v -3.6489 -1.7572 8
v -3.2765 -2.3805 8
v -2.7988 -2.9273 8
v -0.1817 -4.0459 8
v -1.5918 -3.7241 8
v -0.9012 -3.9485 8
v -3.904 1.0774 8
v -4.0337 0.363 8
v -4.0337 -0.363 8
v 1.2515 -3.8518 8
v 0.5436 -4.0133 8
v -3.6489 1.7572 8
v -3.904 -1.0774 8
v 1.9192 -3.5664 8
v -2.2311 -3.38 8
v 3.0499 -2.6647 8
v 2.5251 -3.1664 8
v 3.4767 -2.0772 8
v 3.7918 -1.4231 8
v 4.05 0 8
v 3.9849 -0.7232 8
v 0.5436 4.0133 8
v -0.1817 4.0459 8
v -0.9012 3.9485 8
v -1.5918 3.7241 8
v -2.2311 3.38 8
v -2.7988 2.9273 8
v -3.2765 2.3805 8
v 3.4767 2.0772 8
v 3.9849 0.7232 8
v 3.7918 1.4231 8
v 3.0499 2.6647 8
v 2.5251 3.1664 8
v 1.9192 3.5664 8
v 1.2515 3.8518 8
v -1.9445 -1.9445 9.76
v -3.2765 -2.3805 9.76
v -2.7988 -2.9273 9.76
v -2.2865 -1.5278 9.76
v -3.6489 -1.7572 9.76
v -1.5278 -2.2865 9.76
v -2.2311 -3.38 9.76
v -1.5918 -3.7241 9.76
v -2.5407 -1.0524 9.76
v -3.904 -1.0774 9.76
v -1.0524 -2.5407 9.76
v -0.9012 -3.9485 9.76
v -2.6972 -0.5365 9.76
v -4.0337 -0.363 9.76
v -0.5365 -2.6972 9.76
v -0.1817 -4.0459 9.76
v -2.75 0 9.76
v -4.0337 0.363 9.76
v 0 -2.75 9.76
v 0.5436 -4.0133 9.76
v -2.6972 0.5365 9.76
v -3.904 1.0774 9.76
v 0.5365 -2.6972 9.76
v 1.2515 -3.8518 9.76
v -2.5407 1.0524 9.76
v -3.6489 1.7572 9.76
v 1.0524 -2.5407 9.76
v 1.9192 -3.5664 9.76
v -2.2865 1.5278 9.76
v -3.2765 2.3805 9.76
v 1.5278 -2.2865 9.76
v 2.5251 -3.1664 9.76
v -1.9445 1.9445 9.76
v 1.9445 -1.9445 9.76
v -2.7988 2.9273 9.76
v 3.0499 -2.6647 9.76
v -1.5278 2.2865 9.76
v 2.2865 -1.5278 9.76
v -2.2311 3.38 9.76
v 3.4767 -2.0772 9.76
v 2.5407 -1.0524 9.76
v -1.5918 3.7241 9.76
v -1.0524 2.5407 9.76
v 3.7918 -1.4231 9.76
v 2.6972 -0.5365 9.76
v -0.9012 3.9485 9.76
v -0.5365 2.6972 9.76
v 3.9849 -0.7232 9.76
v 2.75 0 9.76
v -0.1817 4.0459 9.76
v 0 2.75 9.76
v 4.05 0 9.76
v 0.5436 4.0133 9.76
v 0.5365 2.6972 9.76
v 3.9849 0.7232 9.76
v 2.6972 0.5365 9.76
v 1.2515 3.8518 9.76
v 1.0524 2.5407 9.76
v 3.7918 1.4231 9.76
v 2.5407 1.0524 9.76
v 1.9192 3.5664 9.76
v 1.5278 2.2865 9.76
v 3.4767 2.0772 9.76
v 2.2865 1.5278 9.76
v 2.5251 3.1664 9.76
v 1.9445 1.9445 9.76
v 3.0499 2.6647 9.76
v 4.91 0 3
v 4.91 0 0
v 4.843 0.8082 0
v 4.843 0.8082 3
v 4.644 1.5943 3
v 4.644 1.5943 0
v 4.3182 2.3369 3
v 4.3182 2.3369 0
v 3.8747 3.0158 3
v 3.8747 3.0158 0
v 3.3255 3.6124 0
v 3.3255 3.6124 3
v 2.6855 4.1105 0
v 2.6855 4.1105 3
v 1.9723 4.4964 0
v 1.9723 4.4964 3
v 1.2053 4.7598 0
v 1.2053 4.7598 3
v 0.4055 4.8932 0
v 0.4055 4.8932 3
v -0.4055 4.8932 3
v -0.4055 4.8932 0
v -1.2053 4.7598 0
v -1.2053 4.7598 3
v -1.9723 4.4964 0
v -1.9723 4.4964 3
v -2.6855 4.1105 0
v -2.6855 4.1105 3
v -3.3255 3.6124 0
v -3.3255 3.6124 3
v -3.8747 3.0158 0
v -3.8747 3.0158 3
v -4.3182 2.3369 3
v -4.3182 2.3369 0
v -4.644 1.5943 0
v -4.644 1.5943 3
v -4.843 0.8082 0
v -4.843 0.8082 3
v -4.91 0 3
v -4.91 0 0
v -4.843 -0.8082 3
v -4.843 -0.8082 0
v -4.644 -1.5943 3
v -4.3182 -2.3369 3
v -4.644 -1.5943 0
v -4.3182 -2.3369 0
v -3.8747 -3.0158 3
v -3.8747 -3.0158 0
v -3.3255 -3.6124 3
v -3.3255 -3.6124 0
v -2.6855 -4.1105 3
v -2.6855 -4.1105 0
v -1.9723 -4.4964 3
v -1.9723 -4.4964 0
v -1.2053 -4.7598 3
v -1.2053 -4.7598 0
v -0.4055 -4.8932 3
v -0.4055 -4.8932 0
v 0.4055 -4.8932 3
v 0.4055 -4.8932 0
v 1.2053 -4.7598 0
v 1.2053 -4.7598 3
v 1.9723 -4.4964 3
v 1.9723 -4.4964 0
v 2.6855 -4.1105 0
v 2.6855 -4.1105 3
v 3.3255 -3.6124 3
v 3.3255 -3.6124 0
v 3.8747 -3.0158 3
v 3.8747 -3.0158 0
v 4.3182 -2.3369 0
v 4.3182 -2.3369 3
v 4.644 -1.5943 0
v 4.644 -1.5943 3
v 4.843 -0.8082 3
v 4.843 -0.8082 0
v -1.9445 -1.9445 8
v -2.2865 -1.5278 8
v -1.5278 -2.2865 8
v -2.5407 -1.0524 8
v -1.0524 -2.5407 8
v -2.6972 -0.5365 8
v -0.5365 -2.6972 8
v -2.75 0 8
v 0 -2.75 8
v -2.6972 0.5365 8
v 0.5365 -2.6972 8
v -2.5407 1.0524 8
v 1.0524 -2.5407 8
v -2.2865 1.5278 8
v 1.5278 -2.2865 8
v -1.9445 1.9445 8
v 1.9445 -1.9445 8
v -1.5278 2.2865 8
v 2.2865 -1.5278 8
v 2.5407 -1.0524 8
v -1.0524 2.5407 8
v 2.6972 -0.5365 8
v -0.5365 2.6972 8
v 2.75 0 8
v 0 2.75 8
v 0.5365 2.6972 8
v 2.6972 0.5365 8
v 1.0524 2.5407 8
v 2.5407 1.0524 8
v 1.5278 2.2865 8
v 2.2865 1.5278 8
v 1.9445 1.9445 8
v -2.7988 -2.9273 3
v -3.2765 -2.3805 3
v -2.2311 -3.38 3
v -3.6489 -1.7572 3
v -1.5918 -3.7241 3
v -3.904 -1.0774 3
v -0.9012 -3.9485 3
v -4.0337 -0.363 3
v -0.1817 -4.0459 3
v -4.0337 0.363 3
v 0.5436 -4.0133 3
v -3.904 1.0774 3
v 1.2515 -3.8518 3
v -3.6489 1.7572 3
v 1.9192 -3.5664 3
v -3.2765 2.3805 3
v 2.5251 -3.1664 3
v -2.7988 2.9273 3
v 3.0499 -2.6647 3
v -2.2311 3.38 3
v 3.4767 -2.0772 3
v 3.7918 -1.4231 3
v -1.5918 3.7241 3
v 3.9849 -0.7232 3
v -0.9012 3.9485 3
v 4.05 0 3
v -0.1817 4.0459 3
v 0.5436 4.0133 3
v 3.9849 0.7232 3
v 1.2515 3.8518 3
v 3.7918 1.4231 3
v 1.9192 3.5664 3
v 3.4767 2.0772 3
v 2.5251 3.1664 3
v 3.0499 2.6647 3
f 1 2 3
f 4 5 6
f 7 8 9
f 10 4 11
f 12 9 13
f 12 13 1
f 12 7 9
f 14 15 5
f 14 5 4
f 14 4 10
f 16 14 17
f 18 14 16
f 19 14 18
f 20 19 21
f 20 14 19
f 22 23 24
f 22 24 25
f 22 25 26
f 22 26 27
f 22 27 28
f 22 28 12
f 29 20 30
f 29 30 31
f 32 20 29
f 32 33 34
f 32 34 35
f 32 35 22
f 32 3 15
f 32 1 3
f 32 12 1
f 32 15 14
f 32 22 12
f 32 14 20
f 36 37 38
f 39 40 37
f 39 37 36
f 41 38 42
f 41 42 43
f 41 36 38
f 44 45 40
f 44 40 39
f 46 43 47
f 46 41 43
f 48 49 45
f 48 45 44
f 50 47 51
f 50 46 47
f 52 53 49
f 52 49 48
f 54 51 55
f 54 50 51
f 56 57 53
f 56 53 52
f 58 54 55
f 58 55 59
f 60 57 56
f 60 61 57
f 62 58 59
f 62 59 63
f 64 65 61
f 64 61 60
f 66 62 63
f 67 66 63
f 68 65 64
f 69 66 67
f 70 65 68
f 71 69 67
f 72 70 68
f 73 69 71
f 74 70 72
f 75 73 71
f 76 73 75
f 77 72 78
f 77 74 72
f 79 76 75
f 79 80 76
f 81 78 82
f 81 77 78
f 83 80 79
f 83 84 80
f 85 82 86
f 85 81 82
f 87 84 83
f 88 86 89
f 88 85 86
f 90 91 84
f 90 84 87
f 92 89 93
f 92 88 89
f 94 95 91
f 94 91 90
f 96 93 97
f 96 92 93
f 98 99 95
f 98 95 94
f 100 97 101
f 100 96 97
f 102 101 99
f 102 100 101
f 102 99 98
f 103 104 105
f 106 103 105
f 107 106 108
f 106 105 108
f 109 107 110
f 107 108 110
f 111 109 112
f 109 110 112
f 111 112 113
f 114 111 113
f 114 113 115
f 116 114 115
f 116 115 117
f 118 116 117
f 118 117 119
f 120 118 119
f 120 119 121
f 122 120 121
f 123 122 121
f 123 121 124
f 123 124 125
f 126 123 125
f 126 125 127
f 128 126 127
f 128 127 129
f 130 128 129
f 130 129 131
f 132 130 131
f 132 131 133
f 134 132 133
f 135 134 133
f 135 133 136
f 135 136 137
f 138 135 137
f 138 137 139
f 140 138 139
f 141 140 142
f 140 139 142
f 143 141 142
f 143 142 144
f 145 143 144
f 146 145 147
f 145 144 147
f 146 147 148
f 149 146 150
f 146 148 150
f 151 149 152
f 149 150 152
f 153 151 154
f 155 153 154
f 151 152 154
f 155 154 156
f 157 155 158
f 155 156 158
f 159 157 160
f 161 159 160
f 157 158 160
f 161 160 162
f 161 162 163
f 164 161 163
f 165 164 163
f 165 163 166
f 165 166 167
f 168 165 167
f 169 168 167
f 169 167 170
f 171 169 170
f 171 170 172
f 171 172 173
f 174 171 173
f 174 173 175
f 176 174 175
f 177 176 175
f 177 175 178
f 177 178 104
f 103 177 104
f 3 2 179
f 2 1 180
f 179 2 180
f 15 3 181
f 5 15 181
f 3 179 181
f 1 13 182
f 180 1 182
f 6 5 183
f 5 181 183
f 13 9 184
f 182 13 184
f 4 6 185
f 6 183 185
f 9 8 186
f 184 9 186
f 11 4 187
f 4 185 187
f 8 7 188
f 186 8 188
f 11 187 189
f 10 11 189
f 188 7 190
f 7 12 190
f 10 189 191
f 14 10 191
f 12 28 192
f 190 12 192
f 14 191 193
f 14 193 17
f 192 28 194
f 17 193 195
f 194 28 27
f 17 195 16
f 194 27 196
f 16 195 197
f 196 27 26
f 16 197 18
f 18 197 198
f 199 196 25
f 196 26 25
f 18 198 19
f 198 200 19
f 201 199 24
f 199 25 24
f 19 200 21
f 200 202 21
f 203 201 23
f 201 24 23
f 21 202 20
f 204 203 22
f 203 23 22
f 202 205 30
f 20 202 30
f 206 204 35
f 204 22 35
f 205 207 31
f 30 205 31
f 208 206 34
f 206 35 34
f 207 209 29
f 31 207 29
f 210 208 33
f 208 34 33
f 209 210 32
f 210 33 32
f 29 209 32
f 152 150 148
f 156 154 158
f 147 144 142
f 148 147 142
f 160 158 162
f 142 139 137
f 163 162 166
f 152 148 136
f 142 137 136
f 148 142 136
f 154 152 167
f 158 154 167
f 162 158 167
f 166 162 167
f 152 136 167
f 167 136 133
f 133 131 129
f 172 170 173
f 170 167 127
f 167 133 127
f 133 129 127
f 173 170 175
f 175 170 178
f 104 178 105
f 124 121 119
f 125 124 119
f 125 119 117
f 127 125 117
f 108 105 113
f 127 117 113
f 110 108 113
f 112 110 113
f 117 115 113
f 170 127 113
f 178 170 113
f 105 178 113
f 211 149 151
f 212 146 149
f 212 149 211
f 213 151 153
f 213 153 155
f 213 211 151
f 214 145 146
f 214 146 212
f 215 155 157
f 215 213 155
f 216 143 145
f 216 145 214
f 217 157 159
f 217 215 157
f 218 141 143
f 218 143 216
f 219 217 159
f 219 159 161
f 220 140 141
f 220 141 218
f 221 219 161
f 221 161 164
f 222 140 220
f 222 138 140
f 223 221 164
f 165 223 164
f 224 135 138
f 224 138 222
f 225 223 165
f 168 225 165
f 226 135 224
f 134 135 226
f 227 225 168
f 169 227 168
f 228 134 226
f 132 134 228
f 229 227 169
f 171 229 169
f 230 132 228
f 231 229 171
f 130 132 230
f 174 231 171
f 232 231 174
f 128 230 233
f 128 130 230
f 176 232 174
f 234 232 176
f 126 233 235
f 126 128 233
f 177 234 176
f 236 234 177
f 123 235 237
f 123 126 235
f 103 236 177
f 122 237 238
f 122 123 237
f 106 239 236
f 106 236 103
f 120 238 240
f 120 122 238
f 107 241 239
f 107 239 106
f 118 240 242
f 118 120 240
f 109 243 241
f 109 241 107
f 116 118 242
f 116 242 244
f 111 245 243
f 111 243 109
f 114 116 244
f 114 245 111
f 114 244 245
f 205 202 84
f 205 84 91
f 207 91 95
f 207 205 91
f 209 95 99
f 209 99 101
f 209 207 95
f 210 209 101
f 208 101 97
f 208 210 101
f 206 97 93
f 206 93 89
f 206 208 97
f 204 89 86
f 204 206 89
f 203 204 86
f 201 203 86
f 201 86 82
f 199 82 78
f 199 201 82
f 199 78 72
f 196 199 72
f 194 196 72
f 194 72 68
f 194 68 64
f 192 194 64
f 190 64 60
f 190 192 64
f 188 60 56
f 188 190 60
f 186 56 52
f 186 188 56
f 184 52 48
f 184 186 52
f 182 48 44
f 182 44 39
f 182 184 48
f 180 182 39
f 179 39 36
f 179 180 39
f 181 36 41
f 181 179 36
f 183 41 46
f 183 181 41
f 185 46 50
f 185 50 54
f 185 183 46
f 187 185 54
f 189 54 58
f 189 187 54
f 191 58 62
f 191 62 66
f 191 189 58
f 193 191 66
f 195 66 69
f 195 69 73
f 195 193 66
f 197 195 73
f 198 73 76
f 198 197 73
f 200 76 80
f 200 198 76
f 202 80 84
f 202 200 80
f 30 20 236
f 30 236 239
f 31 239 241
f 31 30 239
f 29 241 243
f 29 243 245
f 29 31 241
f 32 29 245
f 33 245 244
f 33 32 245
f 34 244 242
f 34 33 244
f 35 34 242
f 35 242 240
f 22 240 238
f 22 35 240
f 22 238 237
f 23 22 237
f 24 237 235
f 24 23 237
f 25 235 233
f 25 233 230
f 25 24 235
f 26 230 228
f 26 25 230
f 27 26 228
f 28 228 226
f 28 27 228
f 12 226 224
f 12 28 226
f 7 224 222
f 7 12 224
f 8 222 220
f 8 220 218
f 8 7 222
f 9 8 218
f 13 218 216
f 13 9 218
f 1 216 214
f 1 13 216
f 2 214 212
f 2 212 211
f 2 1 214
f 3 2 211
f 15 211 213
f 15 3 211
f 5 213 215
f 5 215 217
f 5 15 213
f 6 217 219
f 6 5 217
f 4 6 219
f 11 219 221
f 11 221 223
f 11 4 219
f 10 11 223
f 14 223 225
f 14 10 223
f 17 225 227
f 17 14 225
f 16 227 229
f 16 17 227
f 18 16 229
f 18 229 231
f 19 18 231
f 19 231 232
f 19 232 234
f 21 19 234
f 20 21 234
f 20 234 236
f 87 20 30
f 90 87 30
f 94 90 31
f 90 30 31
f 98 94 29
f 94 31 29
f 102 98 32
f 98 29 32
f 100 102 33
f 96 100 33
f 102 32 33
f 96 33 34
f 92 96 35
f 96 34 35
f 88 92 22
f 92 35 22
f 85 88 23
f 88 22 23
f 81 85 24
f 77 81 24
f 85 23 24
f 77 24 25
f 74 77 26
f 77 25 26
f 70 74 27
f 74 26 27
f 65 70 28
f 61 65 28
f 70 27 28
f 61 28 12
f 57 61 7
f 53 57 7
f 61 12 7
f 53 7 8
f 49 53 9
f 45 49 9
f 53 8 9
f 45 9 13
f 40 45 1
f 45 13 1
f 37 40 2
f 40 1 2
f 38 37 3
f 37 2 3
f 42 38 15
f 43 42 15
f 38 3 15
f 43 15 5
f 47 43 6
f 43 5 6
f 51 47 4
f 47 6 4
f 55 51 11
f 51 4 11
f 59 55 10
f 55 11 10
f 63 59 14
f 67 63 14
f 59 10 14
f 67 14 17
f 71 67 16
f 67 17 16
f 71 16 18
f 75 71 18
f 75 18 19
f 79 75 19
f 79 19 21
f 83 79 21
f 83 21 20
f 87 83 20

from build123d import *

# Parameters (mm, degrees)
SKETCH1_R           = 4.91
BOSS_EXTRUDE1_DEPTH = 8
SKETCH2_R           = 4.05
SKETCH2_R_2         = 2.75
BOSS_EXTRUDE2_DEPTH = 1.76
SKETCH3_R           = 4.91
SKETCH3_R_2         = 4.05
CUT_EXTRUDE1_DEPTH  = 5


with BuildPart() as part:
    # Sketch1 → Boss-Extrude1 (new body)
    with BuildSketch(Plane.XY):
        Circle(SKETCH1_R)
    extrude(amount=BOSS_EXTRUDE1_DEPTH)

    # Sketch3 → Cut-Extrude1 (cut)
    with BuildSketch(Plane.XY.offset(8)):
        Circle(SKETCH3_R)
        Circle(SKETCH3_R_2, mode=Mode.SUBTRACT)
    extrude(amount=-CUT_EXTRUDE1_DEPTH, mode=Mode.SUBTRACT)


with BuildPart() as body_2:
    # Sketch2 → Boss-Extrude2 (new body)
    with BuildSketch(Plane.XY.offset(8)):
        Circle(SKETCH2_R)
        Circle(SKETCH2_R_2, mode=Mode.SUBTRACT)
    extrude(amount=BOSS_EXTRUDE2_DEPTH)


solid = Compound([part.part, body_2.part])
